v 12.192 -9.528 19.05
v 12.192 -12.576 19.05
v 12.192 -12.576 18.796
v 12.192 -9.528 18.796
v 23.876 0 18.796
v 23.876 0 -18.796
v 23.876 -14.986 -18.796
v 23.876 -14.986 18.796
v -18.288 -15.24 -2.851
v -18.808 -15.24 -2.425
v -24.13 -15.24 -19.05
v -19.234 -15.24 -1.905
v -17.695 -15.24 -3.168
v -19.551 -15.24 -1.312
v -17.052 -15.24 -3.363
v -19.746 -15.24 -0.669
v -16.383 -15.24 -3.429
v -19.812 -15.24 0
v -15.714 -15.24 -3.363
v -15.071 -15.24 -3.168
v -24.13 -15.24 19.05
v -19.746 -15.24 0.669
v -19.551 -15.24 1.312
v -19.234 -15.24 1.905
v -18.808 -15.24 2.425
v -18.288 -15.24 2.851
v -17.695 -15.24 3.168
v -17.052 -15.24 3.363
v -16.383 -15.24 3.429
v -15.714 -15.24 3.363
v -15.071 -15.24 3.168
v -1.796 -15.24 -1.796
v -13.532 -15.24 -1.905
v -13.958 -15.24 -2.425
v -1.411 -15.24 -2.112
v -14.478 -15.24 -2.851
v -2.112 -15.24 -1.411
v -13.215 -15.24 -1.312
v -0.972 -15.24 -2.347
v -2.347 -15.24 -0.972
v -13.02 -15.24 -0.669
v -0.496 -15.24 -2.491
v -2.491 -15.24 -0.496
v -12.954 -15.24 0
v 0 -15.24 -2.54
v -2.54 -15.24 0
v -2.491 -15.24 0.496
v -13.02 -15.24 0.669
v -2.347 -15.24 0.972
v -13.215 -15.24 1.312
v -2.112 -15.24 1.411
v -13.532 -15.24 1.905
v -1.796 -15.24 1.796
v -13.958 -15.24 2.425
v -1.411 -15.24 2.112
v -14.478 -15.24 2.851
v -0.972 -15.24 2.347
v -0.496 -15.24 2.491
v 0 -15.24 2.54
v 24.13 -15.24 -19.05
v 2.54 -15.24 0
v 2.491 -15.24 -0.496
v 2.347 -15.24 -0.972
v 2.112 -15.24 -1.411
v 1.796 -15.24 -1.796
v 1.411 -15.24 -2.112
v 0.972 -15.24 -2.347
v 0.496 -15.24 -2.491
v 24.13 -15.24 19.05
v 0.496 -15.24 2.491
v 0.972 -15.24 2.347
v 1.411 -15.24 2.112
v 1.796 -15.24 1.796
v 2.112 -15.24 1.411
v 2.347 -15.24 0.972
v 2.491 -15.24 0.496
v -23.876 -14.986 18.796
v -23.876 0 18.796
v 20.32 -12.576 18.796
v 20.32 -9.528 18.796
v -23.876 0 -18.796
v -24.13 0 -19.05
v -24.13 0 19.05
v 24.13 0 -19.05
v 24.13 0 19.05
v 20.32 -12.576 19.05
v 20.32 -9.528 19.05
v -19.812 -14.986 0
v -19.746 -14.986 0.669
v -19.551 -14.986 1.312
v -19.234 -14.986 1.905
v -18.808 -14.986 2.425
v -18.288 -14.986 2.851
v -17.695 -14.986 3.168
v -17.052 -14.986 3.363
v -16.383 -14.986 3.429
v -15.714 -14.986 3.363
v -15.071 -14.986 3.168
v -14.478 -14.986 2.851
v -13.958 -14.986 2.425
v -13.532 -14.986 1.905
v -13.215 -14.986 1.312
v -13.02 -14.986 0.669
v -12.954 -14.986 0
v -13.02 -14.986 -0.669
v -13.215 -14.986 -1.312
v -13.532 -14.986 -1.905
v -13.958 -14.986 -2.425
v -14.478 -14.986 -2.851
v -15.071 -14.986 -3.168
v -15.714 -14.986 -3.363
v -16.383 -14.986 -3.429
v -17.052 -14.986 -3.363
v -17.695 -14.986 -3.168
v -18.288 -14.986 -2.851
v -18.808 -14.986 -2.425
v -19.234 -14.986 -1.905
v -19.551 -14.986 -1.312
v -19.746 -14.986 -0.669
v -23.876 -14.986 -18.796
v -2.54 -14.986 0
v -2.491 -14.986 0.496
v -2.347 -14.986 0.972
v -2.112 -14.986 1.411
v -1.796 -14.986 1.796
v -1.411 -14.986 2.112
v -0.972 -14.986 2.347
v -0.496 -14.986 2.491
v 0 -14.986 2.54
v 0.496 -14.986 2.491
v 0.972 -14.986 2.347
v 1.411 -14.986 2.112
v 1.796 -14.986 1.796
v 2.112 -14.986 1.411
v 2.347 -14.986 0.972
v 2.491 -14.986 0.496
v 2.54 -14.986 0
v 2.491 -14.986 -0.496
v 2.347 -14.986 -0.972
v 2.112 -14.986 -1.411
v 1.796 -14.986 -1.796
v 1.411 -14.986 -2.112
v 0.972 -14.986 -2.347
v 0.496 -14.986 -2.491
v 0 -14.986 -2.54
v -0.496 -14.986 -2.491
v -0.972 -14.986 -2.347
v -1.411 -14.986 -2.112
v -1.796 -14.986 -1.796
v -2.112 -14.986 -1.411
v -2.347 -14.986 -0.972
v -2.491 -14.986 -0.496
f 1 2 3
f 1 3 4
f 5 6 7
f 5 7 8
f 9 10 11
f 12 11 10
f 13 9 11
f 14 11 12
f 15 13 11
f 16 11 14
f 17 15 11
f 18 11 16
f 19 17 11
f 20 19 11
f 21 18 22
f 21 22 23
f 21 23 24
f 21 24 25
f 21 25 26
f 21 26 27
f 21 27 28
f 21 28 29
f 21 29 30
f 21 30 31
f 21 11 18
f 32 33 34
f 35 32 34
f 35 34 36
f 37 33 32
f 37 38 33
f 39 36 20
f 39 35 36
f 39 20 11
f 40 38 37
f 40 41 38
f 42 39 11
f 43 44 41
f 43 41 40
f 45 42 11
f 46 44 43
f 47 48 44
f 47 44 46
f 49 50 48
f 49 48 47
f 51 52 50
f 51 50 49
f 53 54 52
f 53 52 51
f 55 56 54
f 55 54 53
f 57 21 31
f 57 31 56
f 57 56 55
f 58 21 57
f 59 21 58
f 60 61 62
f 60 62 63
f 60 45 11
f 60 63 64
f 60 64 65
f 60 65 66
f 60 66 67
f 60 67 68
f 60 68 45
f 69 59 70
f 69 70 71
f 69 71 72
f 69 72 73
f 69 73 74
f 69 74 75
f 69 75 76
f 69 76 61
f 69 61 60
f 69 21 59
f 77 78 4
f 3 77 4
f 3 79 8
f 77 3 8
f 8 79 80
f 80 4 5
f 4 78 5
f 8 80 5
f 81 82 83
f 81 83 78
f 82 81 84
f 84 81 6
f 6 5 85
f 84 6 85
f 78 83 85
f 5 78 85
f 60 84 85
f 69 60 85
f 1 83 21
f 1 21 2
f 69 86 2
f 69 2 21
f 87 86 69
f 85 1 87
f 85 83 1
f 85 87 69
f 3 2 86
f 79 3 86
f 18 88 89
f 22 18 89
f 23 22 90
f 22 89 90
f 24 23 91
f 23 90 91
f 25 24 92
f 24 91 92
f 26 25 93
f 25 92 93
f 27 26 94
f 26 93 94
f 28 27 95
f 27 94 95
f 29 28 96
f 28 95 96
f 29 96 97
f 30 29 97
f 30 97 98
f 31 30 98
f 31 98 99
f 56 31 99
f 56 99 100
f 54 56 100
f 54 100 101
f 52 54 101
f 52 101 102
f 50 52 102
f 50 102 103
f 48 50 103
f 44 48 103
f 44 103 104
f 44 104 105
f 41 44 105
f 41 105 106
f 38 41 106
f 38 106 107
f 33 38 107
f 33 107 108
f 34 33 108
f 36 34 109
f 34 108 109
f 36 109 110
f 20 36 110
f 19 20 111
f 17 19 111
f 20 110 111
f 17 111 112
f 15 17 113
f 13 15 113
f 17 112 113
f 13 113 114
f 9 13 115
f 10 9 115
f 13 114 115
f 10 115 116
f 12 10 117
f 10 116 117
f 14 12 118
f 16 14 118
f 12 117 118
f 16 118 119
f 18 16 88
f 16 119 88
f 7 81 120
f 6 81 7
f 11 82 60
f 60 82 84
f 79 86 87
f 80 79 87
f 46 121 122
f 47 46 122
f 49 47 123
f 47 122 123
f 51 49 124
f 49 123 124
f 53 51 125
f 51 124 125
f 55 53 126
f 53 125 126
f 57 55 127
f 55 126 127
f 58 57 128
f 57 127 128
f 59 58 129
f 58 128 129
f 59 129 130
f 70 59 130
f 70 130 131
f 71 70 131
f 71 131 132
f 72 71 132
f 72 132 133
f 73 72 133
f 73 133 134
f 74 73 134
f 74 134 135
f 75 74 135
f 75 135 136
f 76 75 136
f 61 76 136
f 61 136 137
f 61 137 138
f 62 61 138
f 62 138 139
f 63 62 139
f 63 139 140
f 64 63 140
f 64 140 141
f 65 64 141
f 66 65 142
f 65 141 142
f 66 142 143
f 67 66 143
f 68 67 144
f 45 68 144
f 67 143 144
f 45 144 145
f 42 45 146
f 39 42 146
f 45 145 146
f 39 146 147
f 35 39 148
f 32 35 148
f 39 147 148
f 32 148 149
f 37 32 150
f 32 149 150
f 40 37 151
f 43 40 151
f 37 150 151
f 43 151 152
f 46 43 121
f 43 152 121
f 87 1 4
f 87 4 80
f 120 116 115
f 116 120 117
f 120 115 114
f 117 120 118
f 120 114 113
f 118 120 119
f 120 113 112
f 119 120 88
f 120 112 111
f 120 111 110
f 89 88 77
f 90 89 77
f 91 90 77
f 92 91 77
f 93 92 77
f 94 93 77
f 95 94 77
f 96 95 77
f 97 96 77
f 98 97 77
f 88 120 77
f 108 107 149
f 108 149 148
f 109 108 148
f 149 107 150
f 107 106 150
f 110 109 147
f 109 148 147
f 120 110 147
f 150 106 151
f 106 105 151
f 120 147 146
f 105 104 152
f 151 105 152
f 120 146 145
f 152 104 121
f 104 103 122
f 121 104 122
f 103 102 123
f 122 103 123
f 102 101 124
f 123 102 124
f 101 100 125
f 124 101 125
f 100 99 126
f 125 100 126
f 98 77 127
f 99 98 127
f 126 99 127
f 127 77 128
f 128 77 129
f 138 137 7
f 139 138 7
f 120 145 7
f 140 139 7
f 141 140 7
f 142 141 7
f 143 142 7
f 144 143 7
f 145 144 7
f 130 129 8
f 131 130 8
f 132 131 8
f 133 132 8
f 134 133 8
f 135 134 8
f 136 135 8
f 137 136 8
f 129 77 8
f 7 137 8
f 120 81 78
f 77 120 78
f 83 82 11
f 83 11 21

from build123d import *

# Parameters (mm, degrees)
F0_W     = 48.26
F0_H     = 38.1
F1_DEPTH = 15.24
F3_T     = -0.254
F4_D     = 6.858
F6_D     = 5.08
F7_W     = 8.128
F7_H     = 3.048
F8_DEPTH = 25.4


with BuildPart() as f1:
    # F0 (on Front) → F1 (new body)
    with BuildSketch(Plane.XZ):
        Rectangle(F0_W, F0_H)
    extrude(amount=F1_DEPTH)

    # F3
    f3_openings = [f1.faces().sort_by_distance(p)[0] for p in [
        (0, 0, 0),
    ]]
    offset(amount=F3_T, openings=f3_openings)

    # F4 (through all)
    with Locations(Plane.XZ.offset(15.24)):
        with Locations((-16.383, 0)):
            Hole(F4_D / 2)

    # F6 (through all)
    with Locations(Plane.XZ.offset(15.24)):
        with Locations((0, 0)):
            Hole(F6_D / 2)

    # F7 (on face) → F8 (cut)
    with BuildSketch(Plane.XY.offset(19.05)):
        with Locations((16.256, -11.051697)):
            Rectangle(F7_W, F7_H)
    extrude(amount=-F8_DEPTH, mode=Mode.SUBTRACT)


solid = f1.part
